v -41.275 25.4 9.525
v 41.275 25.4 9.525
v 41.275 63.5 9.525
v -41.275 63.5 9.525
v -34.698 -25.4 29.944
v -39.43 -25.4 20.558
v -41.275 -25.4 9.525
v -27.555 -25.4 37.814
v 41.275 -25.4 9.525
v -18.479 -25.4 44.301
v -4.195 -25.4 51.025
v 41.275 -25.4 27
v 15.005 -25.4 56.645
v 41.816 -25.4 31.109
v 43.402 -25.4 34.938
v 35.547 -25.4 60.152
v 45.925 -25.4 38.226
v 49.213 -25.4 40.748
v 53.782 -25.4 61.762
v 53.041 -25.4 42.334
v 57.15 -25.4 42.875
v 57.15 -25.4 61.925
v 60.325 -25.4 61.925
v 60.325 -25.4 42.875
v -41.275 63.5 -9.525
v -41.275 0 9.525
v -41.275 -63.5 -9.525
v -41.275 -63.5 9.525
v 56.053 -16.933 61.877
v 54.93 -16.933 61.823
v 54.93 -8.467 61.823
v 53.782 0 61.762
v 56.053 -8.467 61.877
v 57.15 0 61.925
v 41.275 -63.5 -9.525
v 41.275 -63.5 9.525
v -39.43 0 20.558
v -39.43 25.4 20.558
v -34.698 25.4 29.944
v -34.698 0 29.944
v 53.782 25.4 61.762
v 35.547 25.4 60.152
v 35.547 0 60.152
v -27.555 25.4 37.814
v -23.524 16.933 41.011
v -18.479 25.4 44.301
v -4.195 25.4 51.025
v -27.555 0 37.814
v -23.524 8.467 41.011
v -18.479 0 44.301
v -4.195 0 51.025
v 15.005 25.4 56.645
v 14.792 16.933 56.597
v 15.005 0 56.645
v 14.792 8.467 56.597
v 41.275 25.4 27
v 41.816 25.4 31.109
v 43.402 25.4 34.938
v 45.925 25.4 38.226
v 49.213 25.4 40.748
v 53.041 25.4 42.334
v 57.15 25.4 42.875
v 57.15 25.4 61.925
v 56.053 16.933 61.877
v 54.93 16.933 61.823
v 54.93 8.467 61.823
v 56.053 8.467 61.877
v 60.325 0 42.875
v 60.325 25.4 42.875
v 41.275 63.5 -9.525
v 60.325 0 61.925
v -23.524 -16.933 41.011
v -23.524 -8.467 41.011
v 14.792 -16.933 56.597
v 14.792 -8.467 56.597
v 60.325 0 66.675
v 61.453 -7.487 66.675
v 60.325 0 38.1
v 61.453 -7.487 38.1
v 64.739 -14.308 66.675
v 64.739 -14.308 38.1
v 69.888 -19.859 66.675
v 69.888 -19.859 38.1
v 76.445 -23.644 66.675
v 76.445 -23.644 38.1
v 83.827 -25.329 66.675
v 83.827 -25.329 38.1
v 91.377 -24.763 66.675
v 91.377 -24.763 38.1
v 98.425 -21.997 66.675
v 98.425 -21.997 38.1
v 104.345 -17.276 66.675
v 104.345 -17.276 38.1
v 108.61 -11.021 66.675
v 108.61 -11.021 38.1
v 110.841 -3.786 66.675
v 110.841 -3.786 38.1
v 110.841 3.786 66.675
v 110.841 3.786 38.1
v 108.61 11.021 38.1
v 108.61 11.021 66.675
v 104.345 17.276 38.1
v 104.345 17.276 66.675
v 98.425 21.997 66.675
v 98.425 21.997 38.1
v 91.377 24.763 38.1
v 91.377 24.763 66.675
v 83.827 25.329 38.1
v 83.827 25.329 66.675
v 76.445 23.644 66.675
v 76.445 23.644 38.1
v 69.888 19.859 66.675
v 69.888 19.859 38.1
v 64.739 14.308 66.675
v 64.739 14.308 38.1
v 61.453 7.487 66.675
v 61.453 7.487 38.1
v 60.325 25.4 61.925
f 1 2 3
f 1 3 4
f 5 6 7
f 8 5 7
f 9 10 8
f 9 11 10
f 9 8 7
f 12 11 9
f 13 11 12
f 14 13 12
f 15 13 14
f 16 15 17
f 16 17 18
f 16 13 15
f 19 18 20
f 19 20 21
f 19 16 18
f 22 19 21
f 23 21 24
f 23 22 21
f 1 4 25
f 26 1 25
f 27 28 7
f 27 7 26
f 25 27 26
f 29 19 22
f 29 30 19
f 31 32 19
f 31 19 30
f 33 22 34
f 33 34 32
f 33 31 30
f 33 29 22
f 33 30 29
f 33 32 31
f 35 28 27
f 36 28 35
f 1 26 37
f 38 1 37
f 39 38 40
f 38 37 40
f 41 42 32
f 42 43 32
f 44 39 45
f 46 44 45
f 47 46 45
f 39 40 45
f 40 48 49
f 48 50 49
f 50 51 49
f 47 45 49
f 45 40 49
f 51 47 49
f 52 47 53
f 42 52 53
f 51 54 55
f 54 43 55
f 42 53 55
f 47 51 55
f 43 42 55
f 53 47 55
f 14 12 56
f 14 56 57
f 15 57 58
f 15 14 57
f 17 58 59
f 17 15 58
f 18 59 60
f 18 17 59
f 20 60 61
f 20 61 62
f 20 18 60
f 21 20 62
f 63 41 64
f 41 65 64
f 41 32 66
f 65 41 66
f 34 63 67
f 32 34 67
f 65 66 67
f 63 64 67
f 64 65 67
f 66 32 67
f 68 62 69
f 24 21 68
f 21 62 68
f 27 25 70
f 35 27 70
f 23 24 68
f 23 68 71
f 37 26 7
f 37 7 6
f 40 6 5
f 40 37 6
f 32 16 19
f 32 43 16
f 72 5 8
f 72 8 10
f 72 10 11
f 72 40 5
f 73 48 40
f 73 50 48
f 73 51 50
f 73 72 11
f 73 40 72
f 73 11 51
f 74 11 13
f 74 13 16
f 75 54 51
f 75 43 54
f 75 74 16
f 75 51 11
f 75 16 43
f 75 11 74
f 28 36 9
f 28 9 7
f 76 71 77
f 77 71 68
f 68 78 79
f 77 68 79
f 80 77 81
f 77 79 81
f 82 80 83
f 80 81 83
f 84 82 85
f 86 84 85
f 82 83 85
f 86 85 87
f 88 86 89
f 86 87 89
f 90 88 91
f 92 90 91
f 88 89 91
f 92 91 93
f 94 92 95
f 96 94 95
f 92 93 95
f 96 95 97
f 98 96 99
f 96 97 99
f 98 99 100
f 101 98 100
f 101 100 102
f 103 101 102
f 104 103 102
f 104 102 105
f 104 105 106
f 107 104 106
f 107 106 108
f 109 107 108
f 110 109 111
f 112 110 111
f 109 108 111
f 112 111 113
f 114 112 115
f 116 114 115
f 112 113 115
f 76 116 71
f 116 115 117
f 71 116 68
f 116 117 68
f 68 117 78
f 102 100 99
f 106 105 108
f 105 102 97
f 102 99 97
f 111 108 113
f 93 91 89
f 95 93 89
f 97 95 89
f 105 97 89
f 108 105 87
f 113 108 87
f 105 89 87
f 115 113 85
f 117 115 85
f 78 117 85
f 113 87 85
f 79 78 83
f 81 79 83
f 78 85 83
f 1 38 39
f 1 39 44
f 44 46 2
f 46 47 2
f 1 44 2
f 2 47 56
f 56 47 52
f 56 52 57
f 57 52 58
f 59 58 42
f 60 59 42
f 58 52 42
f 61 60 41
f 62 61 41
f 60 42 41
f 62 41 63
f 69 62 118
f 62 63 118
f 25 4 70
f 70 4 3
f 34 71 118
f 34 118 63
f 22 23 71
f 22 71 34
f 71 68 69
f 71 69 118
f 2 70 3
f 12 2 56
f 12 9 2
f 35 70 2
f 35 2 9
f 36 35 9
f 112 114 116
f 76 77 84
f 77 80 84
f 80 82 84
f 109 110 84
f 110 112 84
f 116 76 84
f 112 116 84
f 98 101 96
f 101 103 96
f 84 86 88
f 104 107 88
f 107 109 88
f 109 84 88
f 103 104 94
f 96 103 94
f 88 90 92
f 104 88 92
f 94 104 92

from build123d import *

# Parameters (mm, degrees)
F1_DEPTH = 63.5
F2_DEPTH = 25.4


with BuildPart() as f1:
    # F0 (on Front) → F1 (new body, symmetric)
    with BuildSketch(Plane.XZ):
        Polygon((41.275, -9.525), (41.275, 9.525), (22.225, 9.525), (-41.275, 9.525), (-41.275, -9.525), align=None)
    extrude(amount=F1_DEPTH, both=True)

    # F0 (on Front) → F2 (join, symmetric)
    with BuildSketch(Plane.XZ):
        with BuildLine():
            Line((22.225, 9.525), (41.275, 9.525))
            Line((41.275, 9.525), (41.275, 27.0002))
            ThreePointArc((41.275, 27.0002), (45.92468, 38.22552), (57.15, 42.8752))
            Line((57.15, 42.8752), (60.325, 42.8752))
            Line((60.325, 42.8752), (60.325, 61.9252))
            Line((60.325, 61.9252), (57.15, 61.9252))
            add(Edge.make_bspline(
                [(53.782409, 61.762463), (54.94256, 61.825673), (56.066423, 61.879551), (57.15, 61.9252)],
                knots=[107.683779, 107.683779, 107.683779, 107.683779, 111.504536, 111.504536, 111.504536, 111.504536], degree=3))
            ThreePointArc((53.782409, 61.762463), (31.291068, 50.475107), (22.225, 27.0002))
            Line((22.225, 27.0002), (22.225, 9.525))
        make_face()
        with BuildLine():
            Line((-41.275, 9.525), (22.225, 9.525))
            Line((22.225, 9.525), (22.225, 27.0002))
            ThreePointArc((22.225, 27.0002), (31.291068, 50.475107), (53.782409, 61.762463))
            add(Edge.make_bspline(
                [(-41.275, 9.525), (-40.437, 50.787412), (21.084859, 59.980971), (53.782409, 61.762463)],
                knots=[0, 0, 0, 0, 107.683779, 107.683779, 107.683779, 107.683779], degree=3))
        make_face()
    extrude(amount=F2_DEPTH, both=True)

    # F0 (on Front) → F3 (revolve)
    with BuildSketch(Plane.XZ):
        Polygon((60.325, 61.9252), (60.325, 42.8752), (60.325, 38.1), (85.725, 38.1), (85.725, 66.675), (60.325, 66.675), align=None)
    revolve(axis=Axis((85.725, 0, 52.3875), (0, 0, 1)))


solid = f1.part
